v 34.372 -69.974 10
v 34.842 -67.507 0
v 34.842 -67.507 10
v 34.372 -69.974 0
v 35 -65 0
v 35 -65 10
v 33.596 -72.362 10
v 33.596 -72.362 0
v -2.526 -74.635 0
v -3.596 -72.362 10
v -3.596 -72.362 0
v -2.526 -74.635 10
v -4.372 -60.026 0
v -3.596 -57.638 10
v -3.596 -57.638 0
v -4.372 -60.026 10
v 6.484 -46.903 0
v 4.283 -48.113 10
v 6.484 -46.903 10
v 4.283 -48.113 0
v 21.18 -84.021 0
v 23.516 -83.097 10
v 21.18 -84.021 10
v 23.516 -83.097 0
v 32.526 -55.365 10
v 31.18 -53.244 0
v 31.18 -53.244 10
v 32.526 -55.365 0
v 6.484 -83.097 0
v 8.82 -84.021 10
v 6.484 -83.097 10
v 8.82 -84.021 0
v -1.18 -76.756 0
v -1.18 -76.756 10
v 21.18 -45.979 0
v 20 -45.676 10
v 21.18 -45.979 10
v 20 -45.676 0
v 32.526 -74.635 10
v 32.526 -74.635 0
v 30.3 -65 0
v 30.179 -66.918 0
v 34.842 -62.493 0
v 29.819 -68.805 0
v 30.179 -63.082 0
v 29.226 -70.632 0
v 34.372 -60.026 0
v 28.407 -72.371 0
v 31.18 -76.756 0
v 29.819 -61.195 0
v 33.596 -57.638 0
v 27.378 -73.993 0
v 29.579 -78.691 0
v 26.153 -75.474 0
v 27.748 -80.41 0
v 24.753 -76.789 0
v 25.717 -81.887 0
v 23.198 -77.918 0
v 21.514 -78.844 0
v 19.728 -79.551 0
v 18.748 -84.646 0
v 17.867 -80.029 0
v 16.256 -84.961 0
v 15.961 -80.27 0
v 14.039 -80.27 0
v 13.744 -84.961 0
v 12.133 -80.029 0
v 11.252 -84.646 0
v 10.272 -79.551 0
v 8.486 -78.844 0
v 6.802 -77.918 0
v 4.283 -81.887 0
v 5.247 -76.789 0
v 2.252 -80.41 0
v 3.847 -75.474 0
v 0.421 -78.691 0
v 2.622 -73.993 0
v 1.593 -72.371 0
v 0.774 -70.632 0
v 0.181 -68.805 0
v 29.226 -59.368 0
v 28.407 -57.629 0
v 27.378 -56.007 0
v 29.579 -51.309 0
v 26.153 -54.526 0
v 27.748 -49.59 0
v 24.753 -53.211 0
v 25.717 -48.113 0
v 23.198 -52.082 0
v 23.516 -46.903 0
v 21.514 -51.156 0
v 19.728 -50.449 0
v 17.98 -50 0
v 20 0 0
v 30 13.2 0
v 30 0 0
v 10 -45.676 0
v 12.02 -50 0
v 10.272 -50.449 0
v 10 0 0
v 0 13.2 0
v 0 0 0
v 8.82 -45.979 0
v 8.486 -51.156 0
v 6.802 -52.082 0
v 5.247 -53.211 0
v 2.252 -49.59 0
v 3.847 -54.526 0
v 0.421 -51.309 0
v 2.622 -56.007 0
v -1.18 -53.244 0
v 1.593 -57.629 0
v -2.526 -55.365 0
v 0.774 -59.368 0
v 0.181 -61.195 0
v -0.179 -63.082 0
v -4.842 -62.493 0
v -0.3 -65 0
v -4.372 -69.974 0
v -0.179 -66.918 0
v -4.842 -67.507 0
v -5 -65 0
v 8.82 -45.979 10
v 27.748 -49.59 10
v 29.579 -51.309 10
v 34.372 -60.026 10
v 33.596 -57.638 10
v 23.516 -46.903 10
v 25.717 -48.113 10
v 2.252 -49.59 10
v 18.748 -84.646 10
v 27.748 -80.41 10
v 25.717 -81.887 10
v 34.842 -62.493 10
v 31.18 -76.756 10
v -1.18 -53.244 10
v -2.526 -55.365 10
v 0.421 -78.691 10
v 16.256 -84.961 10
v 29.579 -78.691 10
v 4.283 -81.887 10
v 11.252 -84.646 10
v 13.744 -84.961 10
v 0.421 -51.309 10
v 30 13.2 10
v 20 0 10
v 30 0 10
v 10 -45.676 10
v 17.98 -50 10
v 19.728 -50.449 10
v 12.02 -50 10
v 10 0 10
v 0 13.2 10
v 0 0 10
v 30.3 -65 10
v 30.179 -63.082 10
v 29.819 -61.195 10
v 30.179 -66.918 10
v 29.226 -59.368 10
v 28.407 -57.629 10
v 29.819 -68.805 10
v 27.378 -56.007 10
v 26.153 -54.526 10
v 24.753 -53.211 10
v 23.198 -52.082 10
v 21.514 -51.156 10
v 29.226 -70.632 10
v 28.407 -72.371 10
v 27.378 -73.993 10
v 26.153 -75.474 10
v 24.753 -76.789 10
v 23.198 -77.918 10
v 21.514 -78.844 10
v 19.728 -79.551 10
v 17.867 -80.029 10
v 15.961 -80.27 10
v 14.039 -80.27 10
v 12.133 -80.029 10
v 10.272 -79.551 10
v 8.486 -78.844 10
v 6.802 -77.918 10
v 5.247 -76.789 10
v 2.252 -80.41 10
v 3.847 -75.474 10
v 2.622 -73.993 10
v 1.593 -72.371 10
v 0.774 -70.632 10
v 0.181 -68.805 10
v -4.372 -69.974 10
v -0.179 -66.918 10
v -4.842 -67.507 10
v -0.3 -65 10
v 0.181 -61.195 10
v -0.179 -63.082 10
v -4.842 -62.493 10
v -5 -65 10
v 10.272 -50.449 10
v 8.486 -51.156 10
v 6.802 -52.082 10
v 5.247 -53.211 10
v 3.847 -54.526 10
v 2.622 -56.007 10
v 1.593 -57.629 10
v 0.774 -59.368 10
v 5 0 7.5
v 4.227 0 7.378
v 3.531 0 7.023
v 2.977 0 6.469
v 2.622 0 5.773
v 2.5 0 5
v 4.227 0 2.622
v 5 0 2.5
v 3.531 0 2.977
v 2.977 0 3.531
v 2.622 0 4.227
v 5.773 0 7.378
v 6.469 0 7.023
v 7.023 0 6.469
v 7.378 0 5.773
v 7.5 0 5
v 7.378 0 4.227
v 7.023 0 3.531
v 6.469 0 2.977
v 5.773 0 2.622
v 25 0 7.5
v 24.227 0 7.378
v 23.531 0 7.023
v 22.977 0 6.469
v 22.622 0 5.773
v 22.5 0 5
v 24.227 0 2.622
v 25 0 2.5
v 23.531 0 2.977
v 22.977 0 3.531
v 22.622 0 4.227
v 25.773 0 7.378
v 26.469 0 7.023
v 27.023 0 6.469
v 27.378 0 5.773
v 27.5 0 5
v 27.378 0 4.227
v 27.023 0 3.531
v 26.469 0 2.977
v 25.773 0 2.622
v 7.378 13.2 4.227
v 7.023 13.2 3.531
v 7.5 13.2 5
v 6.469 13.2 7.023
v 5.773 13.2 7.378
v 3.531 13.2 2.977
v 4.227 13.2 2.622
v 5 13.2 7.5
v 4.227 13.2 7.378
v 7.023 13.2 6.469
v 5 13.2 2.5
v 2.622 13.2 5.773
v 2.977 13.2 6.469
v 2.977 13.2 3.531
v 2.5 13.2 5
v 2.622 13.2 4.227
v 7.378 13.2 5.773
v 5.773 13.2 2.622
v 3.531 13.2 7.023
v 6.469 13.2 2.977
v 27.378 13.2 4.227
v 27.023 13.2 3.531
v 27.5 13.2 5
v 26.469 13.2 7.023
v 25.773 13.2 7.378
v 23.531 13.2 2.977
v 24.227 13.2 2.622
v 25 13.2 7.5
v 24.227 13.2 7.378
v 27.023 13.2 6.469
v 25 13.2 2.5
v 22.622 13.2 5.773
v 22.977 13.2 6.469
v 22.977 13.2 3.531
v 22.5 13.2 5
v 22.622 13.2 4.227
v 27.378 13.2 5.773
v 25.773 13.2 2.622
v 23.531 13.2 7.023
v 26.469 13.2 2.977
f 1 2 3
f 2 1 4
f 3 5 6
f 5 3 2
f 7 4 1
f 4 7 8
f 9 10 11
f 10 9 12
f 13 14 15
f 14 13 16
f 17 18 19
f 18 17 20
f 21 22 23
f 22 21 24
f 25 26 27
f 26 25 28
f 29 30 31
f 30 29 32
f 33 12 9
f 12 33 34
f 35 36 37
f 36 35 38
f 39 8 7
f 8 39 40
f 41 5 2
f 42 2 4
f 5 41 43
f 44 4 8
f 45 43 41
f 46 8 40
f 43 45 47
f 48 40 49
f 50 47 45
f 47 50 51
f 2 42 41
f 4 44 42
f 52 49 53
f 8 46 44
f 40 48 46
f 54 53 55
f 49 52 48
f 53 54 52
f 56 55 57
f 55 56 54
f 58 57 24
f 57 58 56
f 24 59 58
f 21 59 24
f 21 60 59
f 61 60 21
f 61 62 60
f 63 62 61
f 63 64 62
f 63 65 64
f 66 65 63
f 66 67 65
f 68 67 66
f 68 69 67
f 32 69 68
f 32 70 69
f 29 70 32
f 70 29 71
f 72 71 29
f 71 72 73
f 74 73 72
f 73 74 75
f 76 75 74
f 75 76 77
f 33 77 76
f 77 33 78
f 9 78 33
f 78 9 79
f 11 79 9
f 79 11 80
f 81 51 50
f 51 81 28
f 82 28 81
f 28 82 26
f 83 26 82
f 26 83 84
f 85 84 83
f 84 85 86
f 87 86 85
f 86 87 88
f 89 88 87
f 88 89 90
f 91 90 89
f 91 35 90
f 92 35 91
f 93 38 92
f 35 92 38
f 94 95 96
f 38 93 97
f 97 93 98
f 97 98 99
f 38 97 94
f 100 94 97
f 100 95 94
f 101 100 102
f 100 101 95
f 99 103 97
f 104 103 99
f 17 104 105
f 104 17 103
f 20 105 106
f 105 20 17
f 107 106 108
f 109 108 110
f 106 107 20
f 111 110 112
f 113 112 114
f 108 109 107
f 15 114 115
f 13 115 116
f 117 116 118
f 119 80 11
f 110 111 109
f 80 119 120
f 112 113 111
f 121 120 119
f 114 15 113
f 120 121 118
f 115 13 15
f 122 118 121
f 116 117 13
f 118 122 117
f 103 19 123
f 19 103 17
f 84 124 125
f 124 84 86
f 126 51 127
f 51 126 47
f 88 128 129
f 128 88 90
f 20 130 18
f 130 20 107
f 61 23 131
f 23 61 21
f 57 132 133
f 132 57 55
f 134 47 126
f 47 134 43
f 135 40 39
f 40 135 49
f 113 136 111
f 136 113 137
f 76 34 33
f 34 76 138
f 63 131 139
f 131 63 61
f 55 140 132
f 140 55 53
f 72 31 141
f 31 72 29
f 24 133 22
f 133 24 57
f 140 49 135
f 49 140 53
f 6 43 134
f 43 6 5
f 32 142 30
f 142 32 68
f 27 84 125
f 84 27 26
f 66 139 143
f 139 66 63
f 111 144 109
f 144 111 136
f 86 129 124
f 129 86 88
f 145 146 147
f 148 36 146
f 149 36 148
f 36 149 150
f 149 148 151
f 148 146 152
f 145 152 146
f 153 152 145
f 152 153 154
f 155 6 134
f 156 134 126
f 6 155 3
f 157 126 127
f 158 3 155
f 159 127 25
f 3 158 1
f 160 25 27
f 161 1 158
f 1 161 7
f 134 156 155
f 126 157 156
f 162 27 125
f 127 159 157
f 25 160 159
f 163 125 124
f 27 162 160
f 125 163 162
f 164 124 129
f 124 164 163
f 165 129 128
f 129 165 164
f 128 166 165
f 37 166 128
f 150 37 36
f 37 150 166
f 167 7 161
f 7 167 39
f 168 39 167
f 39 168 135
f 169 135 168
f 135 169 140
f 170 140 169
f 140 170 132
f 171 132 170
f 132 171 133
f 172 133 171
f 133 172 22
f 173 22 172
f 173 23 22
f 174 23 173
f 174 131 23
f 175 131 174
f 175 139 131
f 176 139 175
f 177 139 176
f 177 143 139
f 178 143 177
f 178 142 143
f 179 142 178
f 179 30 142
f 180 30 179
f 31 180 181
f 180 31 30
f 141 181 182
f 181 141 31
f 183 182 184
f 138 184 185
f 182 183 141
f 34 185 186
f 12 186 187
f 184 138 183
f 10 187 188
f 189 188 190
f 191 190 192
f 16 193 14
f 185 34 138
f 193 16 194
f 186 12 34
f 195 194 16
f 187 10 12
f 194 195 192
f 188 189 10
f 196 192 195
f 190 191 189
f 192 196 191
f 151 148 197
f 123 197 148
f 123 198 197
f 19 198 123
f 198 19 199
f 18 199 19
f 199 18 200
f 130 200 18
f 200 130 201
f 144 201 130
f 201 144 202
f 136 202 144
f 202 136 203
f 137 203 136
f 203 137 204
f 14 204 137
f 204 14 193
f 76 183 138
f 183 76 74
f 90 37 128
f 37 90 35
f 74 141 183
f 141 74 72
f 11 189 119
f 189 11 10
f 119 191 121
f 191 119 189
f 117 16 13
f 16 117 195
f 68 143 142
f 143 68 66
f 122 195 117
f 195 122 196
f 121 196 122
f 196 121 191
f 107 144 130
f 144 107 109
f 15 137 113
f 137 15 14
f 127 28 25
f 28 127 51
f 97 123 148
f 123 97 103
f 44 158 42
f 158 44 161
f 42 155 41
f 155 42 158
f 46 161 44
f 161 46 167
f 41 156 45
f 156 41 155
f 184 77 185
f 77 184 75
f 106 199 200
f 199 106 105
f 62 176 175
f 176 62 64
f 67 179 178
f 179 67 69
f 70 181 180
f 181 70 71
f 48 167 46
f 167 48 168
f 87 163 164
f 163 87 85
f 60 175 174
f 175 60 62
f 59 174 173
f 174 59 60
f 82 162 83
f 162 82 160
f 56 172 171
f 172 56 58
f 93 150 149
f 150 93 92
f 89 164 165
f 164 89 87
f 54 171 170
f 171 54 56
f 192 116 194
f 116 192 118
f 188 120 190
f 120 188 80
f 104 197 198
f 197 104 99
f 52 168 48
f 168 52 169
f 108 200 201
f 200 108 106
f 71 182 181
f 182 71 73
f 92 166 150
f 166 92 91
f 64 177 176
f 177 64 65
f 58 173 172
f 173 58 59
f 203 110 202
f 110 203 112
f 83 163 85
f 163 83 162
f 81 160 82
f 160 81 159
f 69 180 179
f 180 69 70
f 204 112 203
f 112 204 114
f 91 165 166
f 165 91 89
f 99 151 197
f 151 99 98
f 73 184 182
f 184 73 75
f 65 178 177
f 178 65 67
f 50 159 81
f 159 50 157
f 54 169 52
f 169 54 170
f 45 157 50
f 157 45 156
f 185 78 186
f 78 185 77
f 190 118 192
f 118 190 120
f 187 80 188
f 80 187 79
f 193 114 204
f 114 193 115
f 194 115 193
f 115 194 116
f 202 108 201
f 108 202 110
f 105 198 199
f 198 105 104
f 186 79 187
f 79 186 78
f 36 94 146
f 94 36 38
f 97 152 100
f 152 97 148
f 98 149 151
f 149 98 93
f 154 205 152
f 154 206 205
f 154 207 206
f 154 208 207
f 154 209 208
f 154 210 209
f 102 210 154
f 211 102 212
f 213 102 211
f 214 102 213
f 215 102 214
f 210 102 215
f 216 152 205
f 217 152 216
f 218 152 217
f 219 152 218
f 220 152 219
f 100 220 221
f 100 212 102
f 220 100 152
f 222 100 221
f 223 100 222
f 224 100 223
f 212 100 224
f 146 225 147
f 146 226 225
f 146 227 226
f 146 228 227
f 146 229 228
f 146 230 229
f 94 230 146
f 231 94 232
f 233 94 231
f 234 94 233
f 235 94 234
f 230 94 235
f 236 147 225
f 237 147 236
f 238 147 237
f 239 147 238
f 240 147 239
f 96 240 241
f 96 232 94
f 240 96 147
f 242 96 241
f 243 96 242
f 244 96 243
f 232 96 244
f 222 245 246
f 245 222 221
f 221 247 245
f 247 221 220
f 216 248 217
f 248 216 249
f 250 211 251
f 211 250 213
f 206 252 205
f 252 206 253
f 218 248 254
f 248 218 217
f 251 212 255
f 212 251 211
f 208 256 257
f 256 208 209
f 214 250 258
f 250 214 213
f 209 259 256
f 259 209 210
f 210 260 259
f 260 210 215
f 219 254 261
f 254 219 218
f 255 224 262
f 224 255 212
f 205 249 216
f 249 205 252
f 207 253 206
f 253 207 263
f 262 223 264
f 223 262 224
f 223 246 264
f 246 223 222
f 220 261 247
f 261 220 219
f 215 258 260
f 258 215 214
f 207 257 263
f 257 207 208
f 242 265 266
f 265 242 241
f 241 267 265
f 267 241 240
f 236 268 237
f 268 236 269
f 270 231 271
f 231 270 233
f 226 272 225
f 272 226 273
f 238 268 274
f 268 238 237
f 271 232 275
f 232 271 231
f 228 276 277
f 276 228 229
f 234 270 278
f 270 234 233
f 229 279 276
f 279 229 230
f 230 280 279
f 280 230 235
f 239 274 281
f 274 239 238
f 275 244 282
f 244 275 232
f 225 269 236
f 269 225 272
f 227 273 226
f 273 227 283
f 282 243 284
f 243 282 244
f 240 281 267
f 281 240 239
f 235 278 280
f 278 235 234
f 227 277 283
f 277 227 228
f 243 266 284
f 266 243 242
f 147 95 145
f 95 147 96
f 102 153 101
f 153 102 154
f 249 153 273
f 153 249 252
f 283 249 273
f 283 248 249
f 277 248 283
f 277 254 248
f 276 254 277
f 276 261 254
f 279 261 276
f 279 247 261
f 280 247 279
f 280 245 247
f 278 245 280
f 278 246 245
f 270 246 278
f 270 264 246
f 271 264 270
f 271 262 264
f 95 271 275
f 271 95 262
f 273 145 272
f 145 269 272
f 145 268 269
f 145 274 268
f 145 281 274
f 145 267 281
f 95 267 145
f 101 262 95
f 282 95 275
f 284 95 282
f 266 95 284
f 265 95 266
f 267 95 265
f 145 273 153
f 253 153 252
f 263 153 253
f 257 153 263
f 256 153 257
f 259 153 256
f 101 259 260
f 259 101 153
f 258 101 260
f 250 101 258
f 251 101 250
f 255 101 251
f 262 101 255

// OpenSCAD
union() {
    rotate(180, [1,0,0]) {

    translate([10,0,-10]) {
        cube([10,50,10]);
    }
    
    translate([15,65,-10]) {
        difference() {
            cylinder(d=40,h=10,$fn=50);
            cylinder(d=30.6,h=10,$fn=50);
        }
    }
}
    difference() {
        cube([30,13.2,10]);
        union() {
            rotate(-90, [1,0,0]) {
                translate([5,-5,0]) {
                    cylinder(d=5,h=50,$fn=20);
                }
                translate([30-5,-5,0]) {
                    cylinder(d=5,h=50,$fn=20);
                }
            }
        }
    }
}
